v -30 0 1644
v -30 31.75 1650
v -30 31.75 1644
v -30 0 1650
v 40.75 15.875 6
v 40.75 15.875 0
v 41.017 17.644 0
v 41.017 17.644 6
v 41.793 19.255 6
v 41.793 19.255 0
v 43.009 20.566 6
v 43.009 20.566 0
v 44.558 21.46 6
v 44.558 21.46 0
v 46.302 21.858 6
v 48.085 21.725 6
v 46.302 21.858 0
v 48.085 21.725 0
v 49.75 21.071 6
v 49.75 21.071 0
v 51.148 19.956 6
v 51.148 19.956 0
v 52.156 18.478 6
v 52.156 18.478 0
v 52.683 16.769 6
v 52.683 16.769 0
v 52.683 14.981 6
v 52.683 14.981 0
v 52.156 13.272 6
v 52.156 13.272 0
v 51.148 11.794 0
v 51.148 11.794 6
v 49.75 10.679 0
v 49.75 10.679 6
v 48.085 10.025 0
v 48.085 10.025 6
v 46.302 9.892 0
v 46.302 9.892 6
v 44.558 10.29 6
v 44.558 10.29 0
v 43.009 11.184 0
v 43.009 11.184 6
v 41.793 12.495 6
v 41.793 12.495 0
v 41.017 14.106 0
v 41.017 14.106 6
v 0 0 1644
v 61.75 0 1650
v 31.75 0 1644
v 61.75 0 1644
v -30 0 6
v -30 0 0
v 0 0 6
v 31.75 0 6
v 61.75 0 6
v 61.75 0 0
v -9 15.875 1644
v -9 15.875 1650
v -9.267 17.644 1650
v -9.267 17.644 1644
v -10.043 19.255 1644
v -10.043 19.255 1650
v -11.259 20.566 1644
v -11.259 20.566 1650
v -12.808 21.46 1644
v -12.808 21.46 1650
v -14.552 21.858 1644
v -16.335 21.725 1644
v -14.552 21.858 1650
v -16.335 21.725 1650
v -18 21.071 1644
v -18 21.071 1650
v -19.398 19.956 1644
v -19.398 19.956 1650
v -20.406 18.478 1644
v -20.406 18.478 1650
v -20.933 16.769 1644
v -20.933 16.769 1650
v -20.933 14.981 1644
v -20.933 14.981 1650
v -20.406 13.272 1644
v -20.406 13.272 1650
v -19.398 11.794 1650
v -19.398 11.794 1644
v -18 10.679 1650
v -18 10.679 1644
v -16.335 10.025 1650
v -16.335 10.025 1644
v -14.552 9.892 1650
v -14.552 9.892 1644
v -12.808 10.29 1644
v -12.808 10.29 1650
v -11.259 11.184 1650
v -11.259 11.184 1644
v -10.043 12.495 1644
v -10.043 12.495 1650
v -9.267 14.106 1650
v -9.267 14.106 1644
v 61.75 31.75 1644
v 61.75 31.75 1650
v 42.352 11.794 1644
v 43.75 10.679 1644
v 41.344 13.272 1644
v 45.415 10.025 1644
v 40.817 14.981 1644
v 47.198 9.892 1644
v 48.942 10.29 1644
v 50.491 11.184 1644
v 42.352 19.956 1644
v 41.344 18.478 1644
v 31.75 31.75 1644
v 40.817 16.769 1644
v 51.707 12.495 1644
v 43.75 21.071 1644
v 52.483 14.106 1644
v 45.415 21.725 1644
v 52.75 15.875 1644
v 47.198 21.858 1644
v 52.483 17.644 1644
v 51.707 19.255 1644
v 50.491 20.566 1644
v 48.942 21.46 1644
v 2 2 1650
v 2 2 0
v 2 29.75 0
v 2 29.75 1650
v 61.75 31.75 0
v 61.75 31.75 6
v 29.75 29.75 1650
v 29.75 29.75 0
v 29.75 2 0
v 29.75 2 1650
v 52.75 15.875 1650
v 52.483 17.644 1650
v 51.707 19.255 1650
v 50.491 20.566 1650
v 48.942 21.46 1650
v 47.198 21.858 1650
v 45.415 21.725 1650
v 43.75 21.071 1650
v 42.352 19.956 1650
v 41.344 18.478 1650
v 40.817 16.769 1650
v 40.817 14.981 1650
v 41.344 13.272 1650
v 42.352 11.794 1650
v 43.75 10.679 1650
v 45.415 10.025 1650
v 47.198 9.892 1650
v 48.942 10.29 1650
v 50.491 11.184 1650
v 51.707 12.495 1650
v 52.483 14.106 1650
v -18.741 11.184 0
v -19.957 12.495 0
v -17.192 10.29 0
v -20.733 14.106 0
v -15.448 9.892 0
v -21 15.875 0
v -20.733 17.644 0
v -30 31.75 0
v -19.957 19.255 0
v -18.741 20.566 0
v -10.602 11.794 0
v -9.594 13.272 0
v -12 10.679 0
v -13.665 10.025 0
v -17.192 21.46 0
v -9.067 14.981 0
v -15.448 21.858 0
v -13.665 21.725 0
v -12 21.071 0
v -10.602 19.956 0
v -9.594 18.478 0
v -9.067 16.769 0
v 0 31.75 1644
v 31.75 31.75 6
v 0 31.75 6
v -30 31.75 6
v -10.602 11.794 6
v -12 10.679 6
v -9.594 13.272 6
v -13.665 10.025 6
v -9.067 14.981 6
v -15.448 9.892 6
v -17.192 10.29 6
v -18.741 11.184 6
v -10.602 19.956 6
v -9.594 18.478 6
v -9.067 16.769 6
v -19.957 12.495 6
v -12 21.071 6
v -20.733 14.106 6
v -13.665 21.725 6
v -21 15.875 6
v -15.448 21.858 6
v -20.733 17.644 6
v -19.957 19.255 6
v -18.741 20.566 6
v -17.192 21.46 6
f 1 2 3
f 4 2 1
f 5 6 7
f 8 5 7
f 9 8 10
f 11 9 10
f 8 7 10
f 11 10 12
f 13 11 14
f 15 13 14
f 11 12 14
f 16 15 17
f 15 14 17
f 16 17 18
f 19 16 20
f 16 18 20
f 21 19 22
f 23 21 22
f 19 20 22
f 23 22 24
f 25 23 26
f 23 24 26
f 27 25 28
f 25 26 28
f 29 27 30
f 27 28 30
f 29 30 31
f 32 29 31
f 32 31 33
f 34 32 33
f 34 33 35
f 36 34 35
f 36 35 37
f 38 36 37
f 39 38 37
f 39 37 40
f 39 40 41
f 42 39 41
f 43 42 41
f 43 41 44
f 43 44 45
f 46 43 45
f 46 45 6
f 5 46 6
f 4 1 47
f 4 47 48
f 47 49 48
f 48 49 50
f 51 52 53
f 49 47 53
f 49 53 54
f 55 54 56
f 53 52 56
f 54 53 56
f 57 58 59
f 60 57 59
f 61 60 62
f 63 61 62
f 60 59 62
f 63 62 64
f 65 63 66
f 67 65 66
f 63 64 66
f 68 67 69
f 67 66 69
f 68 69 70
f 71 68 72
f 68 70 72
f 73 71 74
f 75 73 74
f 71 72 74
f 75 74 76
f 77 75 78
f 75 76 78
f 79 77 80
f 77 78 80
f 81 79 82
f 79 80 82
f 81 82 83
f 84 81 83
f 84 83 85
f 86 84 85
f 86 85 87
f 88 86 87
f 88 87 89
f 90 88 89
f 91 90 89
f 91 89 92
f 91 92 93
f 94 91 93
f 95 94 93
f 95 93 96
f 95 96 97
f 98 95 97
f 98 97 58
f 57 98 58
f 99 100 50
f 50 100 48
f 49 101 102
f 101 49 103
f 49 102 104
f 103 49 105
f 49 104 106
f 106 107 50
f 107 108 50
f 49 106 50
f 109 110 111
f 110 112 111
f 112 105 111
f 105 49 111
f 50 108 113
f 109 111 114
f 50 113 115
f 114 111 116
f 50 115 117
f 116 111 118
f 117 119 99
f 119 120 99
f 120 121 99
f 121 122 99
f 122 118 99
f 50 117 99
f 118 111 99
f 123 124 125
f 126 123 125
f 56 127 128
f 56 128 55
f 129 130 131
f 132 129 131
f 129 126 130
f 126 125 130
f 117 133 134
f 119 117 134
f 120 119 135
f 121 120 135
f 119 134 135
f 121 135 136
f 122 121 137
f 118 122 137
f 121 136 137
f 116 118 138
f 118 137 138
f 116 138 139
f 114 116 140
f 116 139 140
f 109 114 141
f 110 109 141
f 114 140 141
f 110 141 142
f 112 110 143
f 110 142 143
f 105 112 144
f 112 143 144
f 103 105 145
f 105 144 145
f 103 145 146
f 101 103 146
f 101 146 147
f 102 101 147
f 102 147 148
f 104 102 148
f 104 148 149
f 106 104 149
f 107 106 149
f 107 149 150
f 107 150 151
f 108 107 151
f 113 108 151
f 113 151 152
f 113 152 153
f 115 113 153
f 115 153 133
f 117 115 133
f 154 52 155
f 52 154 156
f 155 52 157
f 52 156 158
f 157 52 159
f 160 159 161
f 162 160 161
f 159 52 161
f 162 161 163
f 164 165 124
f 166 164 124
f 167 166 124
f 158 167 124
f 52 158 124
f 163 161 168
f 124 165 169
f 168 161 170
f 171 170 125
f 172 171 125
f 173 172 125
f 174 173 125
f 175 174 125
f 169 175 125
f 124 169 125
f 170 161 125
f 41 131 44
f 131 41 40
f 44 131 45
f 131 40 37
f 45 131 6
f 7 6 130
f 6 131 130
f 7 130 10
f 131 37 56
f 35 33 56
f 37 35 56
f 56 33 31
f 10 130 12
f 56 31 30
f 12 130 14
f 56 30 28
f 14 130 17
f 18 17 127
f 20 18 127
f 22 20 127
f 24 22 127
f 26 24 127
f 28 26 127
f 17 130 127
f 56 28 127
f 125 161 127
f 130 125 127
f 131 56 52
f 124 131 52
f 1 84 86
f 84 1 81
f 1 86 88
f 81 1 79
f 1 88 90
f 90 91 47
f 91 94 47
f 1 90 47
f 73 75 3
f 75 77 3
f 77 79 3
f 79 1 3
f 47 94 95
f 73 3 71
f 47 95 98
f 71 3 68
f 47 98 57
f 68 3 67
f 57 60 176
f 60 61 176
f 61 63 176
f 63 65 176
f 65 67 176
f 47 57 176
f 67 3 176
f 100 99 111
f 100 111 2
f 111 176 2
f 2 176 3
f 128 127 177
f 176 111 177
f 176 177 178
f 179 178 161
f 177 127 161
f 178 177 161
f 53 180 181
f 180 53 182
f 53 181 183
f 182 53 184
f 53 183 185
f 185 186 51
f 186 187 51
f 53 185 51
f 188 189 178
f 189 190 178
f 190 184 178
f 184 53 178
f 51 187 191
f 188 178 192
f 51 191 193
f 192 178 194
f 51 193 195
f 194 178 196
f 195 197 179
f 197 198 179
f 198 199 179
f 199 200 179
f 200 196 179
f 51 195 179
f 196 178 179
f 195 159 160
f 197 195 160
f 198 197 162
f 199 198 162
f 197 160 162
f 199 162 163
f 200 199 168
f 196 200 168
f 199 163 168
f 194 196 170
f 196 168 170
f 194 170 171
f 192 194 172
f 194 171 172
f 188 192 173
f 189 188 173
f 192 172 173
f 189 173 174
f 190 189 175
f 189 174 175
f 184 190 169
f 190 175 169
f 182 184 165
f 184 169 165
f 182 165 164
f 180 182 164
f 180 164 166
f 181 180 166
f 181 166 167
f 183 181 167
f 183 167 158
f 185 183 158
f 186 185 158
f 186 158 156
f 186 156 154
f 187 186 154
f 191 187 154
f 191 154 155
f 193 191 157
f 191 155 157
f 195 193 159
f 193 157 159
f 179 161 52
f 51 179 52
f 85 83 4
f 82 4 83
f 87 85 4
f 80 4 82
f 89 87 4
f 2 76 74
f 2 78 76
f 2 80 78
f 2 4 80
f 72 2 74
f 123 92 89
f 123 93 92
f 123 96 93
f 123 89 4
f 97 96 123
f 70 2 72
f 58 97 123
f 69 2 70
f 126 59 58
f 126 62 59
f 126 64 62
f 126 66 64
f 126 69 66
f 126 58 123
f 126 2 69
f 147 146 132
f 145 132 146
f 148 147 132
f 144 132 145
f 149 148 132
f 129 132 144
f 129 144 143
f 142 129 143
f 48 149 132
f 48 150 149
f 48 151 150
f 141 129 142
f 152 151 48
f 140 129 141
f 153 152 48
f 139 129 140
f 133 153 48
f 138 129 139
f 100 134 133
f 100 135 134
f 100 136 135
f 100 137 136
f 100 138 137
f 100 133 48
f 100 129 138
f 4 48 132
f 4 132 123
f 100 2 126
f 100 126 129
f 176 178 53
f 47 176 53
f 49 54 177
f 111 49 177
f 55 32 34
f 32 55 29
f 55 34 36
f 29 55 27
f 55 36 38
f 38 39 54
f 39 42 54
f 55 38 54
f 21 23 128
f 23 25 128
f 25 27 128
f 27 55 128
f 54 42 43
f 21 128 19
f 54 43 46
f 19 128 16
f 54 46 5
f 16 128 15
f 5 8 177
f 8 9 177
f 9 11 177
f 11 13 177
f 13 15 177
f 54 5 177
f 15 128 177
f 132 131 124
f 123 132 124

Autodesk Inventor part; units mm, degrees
ref_plane "YZ Plane" through (0, 0, 0) normal (1, 0, 0) x (0, 1, 0)
ref_plane "XZ Plane" through (0, 0, 0) normal (0, 1, 0) x (-1, 0, 0)
ref_plane "XY Plane" through (0, 0, 0) normal (0, 0, 1) x (1, 0, 0)
sketch "Sketch2" plane through (0, 0, 0) normal (0, 0, 1) x (1, 0, 0)
  line L0 (0, 0) -> (31.75, 0)
  line L1 (31.75, 0) -> (31.75, 31.75)
  line L2 (31.75, 31.75) -> (0, 31.75)
  line L3 (0, 31.75) -> (0, 0)
  line L4 (2, 29.75) -> (29.75, 29.75)
  line L5 (29.75, 29.75) -> (29.75, 2)
  line L6 (29.75, 2) -> (2, 2)
  line L7 (2, 2) -> (2, 29.75)
  dimension "d0" = 31.75
  dimension "d1" = 31.75
  dimension "d2" = 2
extrude "Extrusion1" add sketch "Sketch2" along normal blind 1650
sketch "Sketch3" plane through (0, 0, 1650) normal (0, 0, 1) x (1, 0, 0)
  line L0 (31.75, 31.75) -> (0, 31.75) projected
  line L1 (0, 31.75) -> (-30, 31.75)
  line L2 (-30, 31.75) -> (-30, 0)
  line L3 (-30, 0) -> (0, 0)
  line L4 (0, 0) -> (0, 31.75)
  line L5 (31.75, 31.75) -> (61.75, 31.75)
  line L6 (61.75, 31.75) -> (61.75, 0)
  line L7 (61.75, 0) -> (31.75, 0)
  line L8 (31.75, 0) -> (31.75, 31.75)
  circle A0 centre (-15, 15.875) radius 6
  circle A1 centre (46.75, 15.875) radius 6
  dimension "d5" = 30
  dimension "d6" = 30
  dimension "d7" = 12
  dimension "d8" = 12
extrude "Extrusion2" add sketch "Sketch3" against normal blind 6
sketch "Sketch4" plane through (0, 0, 0) normal (0, 0, -1) x (-1, 0, 0)
  line L0 (-61.75, 31.75) -> (30, 31.75) projected
  line L1 (30, 0) -> (-61.75, 0) projected
  line L2 (0, 31.75) -> (30, 31.75)
  line L3 (30, 31.75) -> (30, 0)
  line L4 (30, 0) -> (0, 0)
  line L5 (0, 0) -> (0, 31.75)
  line L6 (-31.75, 31.75) -> (-31.75, 0) projected
  line L7 (-31.75, 31.75) -> (-61.75, 31.75)
  line L8 (-61.75, 31.75) -> (-61.75, 0)
  line L9 (-61.75, 0) -> (-31.75, 0)
  line L10 (-31.75, 0) -> (-31.75, 31.75)
  circle A0 centre (-46.75, 15.875) radius 6 projected
  circle A1 centre (-46.75, 15.875) radius 6
  circle A2 centre (15, 15.875) radius 6
  dimension "d11" = 30
  dimension "d12" = 12
extrude "Extrusion3" add sketch "Sketch4" against normal blind 6 contours L0 L6 L1 L8 | L0 L3 L1 L5
properties part number "Bases_Perfiles_Acero"
